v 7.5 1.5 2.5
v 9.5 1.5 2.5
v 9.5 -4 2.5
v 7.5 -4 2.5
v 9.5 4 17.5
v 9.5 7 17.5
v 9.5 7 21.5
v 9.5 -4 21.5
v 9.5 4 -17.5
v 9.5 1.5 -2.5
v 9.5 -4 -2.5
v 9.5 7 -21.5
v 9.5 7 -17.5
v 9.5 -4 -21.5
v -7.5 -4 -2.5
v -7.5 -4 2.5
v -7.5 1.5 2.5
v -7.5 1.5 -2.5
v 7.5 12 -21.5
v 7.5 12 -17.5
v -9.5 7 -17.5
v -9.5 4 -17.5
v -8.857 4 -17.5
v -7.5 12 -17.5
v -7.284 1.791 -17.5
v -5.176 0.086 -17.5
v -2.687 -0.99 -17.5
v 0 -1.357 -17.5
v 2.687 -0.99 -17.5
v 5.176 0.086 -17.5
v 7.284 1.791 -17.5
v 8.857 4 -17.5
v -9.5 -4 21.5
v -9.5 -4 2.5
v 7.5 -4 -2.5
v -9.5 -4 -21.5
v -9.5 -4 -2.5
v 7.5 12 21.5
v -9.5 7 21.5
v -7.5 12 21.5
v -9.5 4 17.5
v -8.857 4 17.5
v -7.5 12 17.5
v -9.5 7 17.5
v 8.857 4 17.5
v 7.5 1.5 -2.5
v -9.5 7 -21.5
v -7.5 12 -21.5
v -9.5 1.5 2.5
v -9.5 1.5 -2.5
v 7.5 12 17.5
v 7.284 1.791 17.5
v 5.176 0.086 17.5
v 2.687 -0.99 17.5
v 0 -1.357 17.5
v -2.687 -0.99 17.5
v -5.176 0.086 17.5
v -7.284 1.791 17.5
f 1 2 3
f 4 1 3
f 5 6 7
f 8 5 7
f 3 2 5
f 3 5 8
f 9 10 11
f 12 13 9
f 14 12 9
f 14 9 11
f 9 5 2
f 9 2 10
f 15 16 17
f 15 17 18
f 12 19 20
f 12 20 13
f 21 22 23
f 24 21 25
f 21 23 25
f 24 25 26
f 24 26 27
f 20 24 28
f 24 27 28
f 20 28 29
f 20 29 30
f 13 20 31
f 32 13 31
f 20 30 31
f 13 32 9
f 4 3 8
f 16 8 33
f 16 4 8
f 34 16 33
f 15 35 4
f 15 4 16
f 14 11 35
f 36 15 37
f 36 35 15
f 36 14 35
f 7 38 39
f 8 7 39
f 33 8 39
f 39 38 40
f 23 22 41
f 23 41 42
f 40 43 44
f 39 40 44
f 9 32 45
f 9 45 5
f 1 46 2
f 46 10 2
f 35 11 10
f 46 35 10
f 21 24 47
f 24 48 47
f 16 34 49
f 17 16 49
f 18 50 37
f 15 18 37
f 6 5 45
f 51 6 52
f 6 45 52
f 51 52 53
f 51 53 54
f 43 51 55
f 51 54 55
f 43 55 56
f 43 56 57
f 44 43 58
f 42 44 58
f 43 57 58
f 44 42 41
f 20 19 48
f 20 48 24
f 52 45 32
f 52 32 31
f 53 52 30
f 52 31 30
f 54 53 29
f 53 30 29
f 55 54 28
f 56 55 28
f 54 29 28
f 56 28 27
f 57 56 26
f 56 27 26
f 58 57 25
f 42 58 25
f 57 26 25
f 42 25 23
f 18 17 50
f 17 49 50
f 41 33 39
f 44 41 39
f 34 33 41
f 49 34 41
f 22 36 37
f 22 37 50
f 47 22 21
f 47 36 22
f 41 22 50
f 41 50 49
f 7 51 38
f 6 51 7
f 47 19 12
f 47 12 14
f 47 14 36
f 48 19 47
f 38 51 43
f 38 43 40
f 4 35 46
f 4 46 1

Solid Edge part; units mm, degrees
sketch "Sketch1" plane through (0, 0, 0) normal (0, 0, 1) x (1, 0, 0)
  line L0 (-9.5, -4) -> (-9.5, 4)
  line L1 (-9.5, 4) -> (-8.8569, 4)
  line L2 (8.8569, 4) -> (9.5, 4)
  line L3 (9.5, 4) -> (9.5, -4)
  line L4 (9.5, -4) -> (-9.5, -4)
  arc A0 (8.8569, 4) -> (-8.8569, 4) centre (0, 8.6428) cw
extrude "Protrusion1" add sketch "Sketch1" along normal mid plane 43
sketch "Sketch2" plane through (0, 0, 0) normal (0, -1, 0) x (1, 0, 0)
  line L0 (9.5, 17.5) -> (-9.5, 17.5)
  line L1 (-9.5, 17.5) -> (-9.5, 21.5)
  line L2 (-9.5, 21.5) -> (9.5, 21.5)
  line L3 (9.5, 21.5) -> (9.5, 17.5)
extrude "ExtrudedProtrusion_2" add sketch "Sketch2" against normal blind 12 and the other way blind 2.4828
mirror "Mirror1" about plane through (0, 0, 0) normal (0, 0, 1) of "ExtrudedProtrusion_2"
sketch "Sketch3" plane through (0, 0, 0) normal (0, 0, 1) x (1, 0, 0)
  line L0 (9.5, 7) -> (9.5, 12)
  line L1 (9.5, 12) -> (7.5, 12)
  line L2 (7.5, 12) -> (9.5, 7)
  line L3 (-7.5, 12) -> (-9.5, 7)
  line L4 (-9.5, 7) -> (-9.5, 12)
  line L5 (-9.5, 12) -> (-7.5, 12)
  dimension "D1" = 2
  dimension "D2" = 5
  dimension "D3" = 2
  dimension "D4" = 5
extrude "Cutout1" cut sketch "Sketch3" along normal through all and the other way through all
sketch "Sketch4" plane through (9.5, 1.5, 0) normal (1, 0, 0) x (0, 0, -1)
  line L0 (2.5, -5.5) -> (2.5, 0)
  line L1 (2.5, 0) -> (-2.5, 0)
  line L2 (-2.5, 0) -> (-2.5, -5.5)
  line L3 (-2.5, -5.5) -> (2.5, -5.5)
extrude "ExtrudedCutout_2" cut sketch "Sketch4" against normal blind 2
mirror "Mirror2" about plane through (0, 0, 0) normal (1, 0, 0) of "ExtrudedCutout_2"
